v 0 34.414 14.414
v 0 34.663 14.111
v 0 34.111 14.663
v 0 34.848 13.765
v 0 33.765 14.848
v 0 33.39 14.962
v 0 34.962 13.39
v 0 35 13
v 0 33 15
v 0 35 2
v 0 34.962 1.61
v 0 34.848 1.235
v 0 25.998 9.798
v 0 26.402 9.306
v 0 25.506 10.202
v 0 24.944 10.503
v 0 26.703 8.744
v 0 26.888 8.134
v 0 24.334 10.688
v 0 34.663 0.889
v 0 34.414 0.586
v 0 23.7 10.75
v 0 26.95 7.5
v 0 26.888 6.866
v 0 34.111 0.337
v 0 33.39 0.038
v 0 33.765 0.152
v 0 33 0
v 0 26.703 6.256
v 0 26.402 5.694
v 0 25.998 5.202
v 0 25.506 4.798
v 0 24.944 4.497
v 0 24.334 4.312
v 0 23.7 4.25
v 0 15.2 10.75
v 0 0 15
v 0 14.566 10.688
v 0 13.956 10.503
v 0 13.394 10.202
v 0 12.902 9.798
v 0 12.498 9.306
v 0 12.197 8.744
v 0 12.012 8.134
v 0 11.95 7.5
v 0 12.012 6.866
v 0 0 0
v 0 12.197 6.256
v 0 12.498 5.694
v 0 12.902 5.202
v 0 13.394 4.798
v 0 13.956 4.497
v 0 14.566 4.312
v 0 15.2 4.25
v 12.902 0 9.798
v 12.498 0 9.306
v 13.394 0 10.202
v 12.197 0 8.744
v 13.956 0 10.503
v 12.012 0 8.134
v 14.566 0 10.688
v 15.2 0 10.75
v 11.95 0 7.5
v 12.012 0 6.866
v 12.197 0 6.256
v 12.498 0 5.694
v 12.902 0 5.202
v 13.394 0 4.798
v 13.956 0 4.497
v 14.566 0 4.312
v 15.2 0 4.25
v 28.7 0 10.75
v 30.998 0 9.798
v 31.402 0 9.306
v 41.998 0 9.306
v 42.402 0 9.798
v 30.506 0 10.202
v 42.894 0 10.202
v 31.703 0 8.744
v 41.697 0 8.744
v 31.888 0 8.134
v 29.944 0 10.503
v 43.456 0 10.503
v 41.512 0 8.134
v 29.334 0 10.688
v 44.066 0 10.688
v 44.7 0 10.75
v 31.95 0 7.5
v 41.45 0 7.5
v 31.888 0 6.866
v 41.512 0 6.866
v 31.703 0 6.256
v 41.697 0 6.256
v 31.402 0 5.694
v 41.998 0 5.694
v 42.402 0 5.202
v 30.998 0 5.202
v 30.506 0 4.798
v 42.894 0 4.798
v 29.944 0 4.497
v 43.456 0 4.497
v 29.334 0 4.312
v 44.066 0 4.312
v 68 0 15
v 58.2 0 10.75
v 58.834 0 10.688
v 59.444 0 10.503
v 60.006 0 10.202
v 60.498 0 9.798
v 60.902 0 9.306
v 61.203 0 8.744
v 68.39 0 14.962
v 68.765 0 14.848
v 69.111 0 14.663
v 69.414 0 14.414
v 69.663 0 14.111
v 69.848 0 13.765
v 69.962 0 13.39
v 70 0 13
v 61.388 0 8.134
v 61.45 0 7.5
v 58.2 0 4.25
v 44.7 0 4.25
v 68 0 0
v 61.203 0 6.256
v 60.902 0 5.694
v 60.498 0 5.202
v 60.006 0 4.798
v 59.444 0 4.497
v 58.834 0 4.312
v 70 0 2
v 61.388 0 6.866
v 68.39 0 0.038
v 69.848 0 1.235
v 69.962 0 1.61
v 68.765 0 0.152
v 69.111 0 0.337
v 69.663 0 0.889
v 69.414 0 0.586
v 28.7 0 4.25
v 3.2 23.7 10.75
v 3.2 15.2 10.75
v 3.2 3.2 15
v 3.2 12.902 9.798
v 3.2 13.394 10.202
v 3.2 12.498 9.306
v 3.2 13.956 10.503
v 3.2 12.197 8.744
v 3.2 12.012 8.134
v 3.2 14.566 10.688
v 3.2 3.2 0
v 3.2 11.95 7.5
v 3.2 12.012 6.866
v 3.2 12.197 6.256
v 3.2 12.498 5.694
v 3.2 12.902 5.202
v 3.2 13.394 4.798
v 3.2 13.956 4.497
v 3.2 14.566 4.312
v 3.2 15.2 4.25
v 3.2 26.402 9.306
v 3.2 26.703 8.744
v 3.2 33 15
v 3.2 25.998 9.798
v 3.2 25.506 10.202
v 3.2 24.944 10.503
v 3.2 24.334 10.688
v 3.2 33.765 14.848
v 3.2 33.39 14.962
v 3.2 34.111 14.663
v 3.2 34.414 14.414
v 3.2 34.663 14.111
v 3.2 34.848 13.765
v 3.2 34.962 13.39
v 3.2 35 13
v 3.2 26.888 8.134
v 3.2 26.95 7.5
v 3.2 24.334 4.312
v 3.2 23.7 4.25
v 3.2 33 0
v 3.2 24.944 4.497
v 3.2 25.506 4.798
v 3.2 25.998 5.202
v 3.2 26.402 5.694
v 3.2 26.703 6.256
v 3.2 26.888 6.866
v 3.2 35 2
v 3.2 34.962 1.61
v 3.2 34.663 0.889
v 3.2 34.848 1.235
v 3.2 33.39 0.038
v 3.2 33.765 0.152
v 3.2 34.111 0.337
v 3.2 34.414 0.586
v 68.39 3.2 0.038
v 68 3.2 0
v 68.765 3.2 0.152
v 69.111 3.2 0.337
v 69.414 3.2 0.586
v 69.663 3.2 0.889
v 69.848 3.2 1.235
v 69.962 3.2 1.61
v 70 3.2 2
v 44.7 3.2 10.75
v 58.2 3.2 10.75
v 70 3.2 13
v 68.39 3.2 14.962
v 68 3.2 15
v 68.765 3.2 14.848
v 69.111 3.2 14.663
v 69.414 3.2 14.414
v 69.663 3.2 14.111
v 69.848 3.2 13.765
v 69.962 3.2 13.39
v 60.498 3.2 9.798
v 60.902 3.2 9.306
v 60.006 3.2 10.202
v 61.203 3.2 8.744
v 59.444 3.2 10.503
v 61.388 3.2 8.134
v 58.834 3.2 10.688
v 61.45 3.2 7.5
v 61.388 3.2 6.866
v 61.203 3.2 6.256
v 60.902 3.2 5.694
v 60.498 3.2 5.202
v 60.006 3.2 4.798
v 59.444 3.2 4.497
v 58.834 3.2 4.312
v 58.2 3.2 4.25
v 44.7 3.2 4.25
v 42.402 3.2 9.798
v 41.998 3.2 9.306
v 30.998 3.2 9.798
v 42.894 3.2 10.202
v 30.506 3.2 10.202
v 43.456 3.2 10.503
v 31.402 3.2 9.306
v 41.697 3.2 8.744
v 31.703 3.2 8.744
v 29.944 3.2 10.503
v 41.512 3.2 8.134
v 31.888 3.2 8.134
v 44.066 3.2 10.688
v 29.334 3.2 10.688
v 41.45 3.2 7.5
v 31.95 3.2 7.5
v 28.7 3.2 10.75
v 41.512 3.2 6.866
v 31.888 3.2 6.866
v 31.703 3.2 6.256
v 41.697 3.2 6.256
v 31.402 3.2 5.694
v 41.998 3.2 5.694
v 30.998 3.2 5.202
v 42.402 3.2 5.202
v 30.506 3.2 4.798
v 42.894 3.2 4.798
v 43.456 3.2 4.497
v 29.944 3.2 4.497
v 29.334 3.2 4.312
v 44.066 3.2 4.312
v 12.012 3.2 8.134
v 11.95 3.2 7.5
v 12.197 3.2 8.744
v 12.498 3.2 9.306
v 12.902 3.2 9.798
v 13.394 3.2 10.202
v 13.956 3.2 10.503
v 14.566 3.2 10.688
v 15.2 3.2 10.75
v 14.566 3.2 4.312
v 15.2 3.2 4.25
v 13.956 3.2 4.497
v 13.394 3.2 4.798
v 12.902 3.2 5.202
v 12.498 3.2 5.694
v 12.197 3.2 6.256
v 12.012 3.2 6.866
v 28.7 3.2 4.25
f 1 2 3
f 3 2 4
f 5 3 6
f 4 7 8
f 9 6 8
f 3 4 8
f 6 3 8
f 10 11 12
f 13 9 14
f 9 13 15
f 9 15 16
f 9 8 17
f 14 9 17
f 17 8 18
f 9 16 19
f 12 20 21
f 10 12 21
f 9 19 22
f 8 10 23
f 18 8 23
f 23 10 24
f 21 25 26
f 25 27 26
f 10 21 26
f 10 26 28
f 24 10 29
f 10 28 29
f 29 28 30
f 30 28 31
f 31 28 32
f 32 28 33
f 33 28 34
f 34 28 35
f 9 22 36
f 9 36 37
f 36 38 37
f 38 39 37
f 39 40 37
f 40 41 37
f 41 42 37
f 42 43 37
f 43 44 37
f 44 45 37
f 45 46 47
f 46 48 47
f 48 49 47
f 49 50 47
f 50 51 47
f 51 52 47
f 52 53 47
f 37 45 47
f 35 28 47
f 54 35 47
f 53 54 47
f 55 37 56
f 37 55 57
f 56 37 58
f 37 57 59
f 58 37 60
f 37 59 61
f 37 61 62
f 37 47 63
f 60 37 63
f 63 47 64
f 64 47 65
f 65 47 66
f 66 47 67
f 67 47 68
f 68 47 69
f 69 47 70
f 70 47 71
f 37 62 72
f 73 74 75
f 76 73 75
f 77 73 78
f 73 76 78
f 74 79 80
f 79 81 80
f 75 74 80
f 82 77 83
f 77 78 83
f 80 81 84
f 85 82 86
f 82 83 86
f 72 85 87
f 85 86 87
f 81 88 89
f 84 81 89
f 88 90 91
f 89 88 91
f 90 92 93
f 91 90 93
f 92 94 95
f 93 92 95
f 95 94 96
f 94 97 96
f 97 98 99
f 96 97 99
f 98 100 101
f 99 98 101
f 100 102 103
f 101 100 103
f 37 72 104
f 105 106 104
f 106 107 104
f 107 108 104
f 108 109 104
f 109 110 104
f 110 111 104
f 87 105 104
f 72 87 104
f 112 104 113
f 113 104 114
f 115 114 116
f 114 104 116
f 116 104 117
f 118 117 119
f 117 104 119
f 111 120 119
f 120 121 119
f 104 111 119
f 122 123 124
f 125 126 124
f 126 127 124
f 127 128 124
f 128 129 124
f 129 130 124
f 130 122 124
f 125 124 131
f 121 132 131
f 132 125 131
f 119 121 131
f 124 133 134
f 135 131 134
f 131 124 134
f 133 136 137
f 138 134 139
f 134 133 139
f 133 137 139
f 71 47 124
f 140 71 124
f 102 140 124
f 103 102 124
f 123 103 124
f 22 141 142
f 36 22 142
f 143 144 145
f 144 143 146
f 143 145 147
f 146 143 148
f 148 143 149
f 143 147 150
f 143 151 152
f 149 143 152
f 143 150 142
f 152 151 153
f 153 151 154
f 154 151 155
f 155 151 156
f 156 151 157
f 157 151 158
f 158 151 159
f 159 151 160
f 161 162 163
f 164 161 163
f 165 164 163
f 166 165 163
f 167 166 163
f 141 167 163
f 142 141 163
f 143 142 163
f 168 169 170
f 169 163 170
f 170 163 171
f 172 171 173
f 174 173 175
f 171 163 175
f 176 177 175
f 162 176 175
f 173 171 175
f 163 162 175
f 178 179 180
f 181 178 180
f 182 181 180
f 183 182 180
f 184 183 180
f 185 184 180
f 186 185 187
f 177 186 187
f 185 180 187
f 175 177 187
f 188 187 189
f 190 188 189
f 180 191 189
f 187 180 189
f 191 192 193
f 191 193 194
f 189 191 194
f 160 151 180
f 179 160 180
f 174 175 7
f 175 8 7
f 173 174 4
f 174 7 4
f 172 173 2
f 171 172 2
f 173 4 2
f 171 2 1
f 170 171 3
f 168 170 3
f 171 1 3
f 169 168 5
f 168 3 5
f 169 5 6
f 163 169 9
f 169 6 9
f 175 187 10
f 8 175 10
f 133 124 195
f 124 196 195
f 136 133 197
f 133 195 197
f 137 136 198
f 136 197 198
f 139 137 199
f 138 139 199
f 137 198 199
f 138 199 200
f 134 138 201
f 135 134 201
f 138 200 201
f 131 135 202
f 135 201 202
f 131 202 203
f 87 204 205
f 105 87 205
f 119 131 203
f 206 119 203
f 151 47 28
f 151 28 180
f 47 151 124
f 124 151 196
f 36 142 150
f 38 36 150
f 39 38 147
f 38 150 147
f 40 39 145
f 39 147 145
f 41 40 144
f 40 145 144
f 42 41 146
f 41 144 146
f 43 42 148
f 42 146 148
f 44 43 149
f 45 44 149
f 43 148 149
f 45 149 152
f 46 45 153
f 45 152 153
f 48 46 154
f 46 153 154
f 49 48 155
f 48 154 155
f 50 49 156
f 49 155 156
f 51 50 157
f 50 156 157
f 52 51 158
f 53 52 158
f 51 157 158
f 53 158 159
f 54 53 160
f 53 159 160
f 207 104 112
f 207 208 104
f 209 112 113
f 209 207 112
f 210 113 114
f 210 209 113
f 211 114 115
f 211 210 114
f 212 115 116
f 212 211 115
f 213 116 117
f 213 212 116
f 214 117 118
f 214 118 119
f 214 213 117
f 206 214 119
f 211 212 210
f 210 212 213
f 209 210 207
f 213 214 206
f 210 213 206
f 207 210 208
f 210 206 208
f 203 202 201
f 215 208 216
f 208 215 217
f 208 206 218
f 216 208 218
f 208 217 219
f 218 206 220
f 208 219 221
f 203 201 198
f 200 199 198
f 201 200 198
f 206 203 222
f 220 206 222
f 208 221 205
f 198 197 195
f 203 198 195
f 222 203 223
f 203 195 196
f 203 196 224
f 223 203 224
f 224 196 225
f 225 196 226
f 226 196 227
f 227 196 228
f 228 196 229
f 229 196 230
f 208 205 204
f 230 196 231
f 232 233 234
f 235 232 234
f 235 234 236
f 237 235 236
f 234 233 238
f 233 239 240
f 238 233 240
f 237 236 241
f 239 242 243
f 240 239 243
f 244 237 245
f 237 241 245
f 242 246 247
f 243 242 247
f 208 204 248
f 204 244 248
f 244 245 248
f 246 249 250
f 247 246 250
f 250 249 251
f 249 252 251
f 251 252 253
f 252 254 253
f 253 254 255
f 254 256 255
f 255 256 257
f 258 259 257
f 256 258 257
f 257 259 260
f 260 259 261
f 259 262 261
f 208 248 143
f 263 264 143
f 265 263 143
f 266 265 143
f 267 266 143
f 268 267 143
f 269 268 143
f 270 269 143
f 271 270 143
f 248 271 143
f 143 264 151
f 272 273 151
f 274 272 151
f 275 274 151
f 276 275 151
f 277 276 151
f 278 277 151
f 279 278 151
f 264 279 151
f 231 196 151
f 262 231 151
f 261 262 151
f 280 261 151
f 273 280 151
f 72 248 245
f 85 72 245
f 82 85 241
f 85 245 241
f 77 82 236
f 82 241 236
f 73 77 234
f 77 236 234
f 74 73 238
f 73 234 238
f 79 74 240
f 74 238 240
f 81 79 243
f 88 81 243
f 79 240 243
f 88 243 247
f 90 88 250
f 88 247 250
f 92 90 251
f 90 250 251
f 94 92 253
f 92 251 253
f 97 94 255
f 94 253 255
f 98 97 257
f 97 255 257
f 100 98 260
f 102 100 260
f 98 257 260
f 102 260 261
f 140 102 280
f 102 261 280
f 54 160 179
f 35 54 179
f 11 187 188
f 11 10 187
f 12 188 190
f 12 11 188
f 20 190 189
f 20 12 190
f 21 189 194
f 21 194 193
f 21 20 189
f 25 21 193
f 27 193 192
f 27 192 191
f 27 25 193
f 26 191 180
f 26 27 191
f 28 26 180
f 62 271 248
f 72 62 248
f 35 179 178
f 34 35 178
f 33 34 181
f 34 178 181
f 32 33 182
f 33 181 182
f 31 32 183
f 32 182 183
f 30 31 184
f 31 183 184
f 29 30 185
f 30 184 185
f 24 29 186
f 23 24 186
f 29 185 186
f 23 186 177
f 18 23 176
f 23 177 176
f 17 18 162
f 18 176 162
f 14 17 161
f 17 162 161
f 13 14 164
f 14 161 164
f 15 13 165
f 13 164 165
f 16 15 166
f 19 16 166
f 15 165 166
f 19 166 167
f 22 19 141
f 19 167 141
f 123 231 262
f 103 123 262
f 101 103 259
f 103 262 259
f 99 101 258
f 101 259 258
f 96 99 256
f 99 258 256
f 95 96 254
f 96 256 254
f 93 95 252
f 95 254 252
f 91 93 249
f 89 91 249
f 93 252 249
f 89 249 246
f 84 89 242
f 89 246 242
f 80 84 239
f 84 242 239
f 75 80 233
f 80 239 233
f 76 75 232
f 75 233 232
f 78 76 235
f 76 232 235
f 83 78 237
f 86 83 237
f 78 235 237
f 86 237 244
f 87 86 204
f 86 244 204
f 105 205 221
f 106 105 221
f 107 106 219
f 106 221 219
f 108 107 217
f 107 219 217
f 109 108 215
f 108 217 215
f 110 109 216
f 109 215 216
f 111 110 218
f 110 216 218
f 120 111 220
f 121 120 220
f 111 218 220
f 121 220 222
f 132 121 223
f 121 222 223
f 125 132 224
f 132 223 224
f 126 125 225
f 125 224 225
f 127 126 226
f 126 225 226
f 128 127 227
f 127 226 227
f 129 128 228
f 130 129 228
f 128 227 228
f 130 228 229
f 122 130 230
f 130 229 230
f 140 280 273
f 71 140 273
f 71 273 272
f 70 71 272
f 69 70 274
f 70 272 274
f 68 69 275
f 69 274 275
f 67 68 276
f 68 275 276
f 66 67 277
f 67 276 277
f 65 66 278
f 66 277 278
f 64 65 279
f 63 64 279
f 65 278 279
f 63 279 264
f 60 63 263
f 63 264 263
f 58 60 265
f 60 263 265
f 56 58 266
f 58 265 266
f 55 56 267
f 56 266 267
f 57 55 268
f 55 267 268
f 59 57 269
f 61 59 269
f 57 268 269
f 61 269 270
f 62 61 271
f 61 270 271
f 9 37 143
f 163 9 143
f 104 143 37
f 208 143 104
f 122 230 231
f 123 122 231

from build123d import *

# Parameters (mm, degrees)
F1_DEPTH = 15
F4_DEPTH = 3.201
F5_DEPTH = 3.201
F6_R     = 2


with BuildPart() as f1:
    # F0 (on Top) → F1 (new body)
    with BuildSketch(Plane.XY):
        Polygon((3.2, 35), (0, 35), (0, 0), (70, 0), (70, 3.2), (3.2, 3.2), align=None)
    extrude(amount=F1_DEPTH)

    # F2 (on face) → F4 (cut, through all)
    with BuildSketch(Plane(origin=(0, 3.2, 0), x_dir=(-1, 0, 0), z_dir=(0, 1, 0))):
        with BuildLine():
            Line((-15.2, 10.75), (-28.7, 10.75))
            ThreePointArc((-28.7, 10.75), (-31.95, 7.5), (-28.7, 4.25))
            Line((-28.7, 4.25), (-15.2, 4.25))
            ThreePointArc((-15.2, 4.25), (-11.95, 7.5), (-15.2, 10.75))
        make_face()
        with BuildLine():
            Line((-58.2, 4.25), (-44.7, 4.25))
            ThreePointArc((-44.7, 4.25), (-41.45, 7.5), (-44.7, 10.75))
            Line((-44.7, 10.75), (-58.2, 10.75))
            ThreePointArc((-58.2, 10.75), (-61.45, 7.5), (-58.2, 4.25))
        make_face()
    extrude(amount=-F4_DEPTH, mode=Mode.SUBTRACT)

    # F3 (on face) → F5 (cut, through all)
    with BuildSketch(Plane.YZ.offset(3.2)):
        with BuildLine():
            Line((23.7, 10.75), (15.2, 10.75))
            ThreePointArc((15.2, 10.75), (11.95, 7.5), (15.2, 4.25))
            Line((15.2, 4.25), (23.7, 4.25))
            ThreePointArc((23.7, 4.25), (26.95, 7.5), (23.7, 10.75))
        make_face()
    extrude(amount=-F5_DEPTH, mode=Mode.SUBTRACT)

    # F6
    f6_edges = [f1.edges().sort_by_distance(p)[0] for p in [
        (70, 1.6, 15),
        (70, 1.6, 0),
        (1.6, 35, 15),
        (1.6, 35, 0),
    ]]
    fillet(f6_edges, radius=F6_R)


solid = f1.part
